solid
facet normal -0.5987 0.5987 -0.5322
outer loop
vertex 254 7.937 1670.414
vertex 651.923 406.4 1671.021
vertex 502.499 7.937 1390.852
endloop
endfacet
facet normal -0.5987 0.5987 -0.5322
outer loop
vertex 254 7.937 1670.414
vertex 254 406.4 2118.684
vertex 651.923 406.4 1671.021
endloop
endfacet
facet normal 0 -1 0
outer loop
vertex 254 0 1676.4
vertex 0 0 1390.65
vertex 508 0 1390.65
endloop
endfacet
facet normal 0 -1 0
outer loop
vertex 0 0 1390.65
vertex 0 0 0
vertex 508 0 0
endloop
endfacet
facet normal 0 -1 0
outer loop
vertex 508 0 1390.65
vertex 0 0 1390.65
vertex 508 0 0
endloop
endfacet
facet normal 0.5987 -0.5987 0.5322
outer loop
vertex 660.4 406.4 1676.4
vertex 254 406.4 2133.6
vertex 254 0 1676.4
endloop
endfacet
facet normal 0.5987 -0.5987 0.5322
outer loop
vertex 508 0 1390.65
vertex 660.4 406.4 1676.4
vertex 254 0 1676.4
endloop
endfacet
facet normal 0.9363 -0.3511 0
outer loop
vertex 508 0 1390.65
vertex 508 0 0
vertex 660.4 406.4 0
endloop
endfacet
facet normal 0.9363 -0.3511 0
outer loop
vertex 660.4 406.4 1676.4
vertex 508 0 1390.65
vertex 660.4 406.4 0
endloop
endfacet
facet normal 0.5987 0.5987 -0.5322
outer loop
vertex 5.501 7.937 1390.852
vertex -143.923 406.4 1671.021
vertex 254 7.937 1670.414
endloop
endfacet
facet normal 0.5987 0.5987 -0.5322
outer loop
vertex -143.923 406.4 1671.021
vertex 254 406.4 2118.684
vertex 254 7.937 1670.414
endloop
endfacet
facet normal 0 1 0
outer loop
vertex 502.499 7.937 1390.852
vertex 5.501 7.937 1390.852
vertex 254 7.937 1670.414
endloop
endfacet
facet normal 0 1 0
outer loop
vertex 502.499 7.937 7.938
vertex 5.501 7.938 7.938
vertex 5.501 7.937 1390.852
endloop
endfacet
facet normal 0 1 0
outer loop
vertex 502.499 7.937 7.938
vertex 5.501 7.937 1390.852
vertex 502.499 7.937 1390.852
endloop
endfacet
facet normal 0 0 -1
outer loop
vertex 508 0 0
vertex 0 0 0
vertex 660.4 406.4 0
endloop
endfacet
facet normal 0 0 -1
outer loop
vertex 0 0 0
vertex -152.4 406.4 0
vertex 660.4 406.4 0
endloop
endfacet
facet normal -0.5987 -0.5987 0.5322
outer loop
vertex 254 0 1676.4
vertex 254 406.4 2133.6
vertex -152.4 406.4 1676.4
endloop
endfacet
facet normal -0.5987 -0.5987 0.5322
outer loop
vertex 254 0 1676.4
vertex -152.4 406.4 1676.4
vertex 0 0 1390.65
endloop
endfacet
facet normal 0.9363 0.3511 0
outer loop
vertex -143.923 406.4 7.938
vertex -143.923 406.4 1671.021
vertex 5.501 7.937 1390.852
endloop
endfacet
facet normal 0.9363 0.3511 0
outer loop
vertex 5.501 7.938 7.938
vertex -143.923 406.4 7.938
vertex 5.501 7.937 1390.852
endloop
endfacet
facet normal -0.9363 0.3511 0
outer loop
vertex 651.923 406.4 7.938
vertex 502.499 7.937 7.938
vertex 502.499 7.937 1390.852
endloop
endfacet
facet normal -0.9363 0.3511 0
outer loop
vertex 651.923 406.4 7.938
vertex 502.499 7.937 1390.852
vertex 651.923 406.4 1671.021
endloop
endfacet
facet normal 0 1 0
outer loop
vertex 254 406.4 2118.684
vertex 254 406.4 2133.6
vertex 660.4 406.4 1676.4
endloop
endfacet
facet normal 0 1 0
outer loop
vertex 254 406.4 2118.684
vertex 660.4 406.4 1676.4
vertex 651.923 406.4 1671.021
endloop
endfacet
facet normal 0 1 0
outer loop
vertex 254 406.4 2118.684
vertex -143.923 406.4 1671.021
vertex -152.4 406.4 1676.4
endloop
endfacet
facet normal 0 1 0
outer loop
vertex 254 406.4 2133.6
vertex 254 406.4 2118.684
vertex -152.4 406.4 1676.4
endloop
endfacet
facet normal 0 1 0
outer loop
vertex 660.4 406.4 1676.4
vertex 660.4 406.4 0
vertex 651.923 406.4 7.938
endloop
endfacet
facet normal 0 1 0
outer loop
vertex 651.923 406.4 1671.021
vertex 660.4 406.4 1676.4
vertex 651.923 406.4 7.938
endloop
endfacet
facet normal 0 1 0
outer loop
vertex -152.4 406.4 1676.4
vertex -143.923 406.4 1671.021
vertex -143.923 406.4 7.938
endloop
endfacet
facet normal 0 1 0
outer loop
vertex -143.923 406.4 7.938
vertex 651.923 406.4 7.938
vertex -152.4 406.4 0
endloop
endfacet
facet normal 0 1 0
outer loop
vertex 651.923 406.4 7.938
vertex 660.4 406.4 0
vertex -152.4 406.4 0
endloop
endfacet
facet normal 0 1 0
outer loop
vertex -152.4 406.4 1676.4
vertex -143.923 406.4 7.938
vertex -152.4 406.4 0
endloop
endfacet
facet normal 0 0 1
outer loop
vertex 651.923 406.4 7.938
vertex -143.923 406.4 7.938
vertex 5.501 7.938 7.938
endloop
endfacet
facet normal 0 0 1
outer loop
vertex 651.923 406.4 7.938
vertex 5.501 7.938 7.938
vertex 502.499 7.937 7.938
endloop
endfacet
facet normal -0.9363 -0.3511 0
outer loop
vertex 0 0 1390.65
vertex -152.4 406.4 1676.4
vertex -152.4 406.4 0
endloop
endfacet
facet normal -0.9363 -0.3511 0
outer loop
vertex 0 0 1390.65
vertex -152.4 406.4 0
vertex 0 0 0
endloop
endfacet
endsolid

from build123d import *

# Parameters (mm, degrees)
BOSS_EXTRUDE1_DEPTH = 2133.6
CUT_EXTRUDE2_DEPTH  = 613.218203925
SHELL1_T            = -7.9375


with BuildPart() as part:
    # Sketch1 → Boss-Extrude1 (new body)
    with BuildSketch(Plane.XY):
        Polygon((0, 0), (508, 0), (660.4, 406.4), (-152.4, 406.4), align=None)
    extrude(amount=BOSS_EXTRUDE1_DEPTH)

    # Sketch13 → Cut-Extrude2 (cut, symmetric, along a direction that is not the sketch's normal)
    with BuildSketch(Plane(origin=(254, 0, 0), x_dir=(0, 0, -1), z_dir=(1, 0, 0))):
        Polygon((-2133.6, 0), (-3174.648587482, 0), (-3174.648587482, 406.4), (-2133.6, 406.4), (-1676.4, 0), align=None)
    cut_extrude2 = extrude(amount=CUT_EXTRUDE2_DEPTH, dir=(0.664363839, 0, 0.747409319), both=True, mode=Mode.SUBTRACT)

    # Mirror1: Cut-Extrude2 across plane
    add(cut_extrude2.mirror(Plane(origin=(254, 0, 0), x_dir=(0, 0, 1), z_dir=(1, 0, 0))), mode=Mode.SUBTRACT)

    # Shell1
    shell1_openings = [part.faces().sort_by_distance(p)[0] for p in [
        (254, 406.4, 1097.28),
    ]]
    offset(amount=SHELL1_T, openings=shell1_openings, kind=Kind.INTERSECTION)


solid = part.part
